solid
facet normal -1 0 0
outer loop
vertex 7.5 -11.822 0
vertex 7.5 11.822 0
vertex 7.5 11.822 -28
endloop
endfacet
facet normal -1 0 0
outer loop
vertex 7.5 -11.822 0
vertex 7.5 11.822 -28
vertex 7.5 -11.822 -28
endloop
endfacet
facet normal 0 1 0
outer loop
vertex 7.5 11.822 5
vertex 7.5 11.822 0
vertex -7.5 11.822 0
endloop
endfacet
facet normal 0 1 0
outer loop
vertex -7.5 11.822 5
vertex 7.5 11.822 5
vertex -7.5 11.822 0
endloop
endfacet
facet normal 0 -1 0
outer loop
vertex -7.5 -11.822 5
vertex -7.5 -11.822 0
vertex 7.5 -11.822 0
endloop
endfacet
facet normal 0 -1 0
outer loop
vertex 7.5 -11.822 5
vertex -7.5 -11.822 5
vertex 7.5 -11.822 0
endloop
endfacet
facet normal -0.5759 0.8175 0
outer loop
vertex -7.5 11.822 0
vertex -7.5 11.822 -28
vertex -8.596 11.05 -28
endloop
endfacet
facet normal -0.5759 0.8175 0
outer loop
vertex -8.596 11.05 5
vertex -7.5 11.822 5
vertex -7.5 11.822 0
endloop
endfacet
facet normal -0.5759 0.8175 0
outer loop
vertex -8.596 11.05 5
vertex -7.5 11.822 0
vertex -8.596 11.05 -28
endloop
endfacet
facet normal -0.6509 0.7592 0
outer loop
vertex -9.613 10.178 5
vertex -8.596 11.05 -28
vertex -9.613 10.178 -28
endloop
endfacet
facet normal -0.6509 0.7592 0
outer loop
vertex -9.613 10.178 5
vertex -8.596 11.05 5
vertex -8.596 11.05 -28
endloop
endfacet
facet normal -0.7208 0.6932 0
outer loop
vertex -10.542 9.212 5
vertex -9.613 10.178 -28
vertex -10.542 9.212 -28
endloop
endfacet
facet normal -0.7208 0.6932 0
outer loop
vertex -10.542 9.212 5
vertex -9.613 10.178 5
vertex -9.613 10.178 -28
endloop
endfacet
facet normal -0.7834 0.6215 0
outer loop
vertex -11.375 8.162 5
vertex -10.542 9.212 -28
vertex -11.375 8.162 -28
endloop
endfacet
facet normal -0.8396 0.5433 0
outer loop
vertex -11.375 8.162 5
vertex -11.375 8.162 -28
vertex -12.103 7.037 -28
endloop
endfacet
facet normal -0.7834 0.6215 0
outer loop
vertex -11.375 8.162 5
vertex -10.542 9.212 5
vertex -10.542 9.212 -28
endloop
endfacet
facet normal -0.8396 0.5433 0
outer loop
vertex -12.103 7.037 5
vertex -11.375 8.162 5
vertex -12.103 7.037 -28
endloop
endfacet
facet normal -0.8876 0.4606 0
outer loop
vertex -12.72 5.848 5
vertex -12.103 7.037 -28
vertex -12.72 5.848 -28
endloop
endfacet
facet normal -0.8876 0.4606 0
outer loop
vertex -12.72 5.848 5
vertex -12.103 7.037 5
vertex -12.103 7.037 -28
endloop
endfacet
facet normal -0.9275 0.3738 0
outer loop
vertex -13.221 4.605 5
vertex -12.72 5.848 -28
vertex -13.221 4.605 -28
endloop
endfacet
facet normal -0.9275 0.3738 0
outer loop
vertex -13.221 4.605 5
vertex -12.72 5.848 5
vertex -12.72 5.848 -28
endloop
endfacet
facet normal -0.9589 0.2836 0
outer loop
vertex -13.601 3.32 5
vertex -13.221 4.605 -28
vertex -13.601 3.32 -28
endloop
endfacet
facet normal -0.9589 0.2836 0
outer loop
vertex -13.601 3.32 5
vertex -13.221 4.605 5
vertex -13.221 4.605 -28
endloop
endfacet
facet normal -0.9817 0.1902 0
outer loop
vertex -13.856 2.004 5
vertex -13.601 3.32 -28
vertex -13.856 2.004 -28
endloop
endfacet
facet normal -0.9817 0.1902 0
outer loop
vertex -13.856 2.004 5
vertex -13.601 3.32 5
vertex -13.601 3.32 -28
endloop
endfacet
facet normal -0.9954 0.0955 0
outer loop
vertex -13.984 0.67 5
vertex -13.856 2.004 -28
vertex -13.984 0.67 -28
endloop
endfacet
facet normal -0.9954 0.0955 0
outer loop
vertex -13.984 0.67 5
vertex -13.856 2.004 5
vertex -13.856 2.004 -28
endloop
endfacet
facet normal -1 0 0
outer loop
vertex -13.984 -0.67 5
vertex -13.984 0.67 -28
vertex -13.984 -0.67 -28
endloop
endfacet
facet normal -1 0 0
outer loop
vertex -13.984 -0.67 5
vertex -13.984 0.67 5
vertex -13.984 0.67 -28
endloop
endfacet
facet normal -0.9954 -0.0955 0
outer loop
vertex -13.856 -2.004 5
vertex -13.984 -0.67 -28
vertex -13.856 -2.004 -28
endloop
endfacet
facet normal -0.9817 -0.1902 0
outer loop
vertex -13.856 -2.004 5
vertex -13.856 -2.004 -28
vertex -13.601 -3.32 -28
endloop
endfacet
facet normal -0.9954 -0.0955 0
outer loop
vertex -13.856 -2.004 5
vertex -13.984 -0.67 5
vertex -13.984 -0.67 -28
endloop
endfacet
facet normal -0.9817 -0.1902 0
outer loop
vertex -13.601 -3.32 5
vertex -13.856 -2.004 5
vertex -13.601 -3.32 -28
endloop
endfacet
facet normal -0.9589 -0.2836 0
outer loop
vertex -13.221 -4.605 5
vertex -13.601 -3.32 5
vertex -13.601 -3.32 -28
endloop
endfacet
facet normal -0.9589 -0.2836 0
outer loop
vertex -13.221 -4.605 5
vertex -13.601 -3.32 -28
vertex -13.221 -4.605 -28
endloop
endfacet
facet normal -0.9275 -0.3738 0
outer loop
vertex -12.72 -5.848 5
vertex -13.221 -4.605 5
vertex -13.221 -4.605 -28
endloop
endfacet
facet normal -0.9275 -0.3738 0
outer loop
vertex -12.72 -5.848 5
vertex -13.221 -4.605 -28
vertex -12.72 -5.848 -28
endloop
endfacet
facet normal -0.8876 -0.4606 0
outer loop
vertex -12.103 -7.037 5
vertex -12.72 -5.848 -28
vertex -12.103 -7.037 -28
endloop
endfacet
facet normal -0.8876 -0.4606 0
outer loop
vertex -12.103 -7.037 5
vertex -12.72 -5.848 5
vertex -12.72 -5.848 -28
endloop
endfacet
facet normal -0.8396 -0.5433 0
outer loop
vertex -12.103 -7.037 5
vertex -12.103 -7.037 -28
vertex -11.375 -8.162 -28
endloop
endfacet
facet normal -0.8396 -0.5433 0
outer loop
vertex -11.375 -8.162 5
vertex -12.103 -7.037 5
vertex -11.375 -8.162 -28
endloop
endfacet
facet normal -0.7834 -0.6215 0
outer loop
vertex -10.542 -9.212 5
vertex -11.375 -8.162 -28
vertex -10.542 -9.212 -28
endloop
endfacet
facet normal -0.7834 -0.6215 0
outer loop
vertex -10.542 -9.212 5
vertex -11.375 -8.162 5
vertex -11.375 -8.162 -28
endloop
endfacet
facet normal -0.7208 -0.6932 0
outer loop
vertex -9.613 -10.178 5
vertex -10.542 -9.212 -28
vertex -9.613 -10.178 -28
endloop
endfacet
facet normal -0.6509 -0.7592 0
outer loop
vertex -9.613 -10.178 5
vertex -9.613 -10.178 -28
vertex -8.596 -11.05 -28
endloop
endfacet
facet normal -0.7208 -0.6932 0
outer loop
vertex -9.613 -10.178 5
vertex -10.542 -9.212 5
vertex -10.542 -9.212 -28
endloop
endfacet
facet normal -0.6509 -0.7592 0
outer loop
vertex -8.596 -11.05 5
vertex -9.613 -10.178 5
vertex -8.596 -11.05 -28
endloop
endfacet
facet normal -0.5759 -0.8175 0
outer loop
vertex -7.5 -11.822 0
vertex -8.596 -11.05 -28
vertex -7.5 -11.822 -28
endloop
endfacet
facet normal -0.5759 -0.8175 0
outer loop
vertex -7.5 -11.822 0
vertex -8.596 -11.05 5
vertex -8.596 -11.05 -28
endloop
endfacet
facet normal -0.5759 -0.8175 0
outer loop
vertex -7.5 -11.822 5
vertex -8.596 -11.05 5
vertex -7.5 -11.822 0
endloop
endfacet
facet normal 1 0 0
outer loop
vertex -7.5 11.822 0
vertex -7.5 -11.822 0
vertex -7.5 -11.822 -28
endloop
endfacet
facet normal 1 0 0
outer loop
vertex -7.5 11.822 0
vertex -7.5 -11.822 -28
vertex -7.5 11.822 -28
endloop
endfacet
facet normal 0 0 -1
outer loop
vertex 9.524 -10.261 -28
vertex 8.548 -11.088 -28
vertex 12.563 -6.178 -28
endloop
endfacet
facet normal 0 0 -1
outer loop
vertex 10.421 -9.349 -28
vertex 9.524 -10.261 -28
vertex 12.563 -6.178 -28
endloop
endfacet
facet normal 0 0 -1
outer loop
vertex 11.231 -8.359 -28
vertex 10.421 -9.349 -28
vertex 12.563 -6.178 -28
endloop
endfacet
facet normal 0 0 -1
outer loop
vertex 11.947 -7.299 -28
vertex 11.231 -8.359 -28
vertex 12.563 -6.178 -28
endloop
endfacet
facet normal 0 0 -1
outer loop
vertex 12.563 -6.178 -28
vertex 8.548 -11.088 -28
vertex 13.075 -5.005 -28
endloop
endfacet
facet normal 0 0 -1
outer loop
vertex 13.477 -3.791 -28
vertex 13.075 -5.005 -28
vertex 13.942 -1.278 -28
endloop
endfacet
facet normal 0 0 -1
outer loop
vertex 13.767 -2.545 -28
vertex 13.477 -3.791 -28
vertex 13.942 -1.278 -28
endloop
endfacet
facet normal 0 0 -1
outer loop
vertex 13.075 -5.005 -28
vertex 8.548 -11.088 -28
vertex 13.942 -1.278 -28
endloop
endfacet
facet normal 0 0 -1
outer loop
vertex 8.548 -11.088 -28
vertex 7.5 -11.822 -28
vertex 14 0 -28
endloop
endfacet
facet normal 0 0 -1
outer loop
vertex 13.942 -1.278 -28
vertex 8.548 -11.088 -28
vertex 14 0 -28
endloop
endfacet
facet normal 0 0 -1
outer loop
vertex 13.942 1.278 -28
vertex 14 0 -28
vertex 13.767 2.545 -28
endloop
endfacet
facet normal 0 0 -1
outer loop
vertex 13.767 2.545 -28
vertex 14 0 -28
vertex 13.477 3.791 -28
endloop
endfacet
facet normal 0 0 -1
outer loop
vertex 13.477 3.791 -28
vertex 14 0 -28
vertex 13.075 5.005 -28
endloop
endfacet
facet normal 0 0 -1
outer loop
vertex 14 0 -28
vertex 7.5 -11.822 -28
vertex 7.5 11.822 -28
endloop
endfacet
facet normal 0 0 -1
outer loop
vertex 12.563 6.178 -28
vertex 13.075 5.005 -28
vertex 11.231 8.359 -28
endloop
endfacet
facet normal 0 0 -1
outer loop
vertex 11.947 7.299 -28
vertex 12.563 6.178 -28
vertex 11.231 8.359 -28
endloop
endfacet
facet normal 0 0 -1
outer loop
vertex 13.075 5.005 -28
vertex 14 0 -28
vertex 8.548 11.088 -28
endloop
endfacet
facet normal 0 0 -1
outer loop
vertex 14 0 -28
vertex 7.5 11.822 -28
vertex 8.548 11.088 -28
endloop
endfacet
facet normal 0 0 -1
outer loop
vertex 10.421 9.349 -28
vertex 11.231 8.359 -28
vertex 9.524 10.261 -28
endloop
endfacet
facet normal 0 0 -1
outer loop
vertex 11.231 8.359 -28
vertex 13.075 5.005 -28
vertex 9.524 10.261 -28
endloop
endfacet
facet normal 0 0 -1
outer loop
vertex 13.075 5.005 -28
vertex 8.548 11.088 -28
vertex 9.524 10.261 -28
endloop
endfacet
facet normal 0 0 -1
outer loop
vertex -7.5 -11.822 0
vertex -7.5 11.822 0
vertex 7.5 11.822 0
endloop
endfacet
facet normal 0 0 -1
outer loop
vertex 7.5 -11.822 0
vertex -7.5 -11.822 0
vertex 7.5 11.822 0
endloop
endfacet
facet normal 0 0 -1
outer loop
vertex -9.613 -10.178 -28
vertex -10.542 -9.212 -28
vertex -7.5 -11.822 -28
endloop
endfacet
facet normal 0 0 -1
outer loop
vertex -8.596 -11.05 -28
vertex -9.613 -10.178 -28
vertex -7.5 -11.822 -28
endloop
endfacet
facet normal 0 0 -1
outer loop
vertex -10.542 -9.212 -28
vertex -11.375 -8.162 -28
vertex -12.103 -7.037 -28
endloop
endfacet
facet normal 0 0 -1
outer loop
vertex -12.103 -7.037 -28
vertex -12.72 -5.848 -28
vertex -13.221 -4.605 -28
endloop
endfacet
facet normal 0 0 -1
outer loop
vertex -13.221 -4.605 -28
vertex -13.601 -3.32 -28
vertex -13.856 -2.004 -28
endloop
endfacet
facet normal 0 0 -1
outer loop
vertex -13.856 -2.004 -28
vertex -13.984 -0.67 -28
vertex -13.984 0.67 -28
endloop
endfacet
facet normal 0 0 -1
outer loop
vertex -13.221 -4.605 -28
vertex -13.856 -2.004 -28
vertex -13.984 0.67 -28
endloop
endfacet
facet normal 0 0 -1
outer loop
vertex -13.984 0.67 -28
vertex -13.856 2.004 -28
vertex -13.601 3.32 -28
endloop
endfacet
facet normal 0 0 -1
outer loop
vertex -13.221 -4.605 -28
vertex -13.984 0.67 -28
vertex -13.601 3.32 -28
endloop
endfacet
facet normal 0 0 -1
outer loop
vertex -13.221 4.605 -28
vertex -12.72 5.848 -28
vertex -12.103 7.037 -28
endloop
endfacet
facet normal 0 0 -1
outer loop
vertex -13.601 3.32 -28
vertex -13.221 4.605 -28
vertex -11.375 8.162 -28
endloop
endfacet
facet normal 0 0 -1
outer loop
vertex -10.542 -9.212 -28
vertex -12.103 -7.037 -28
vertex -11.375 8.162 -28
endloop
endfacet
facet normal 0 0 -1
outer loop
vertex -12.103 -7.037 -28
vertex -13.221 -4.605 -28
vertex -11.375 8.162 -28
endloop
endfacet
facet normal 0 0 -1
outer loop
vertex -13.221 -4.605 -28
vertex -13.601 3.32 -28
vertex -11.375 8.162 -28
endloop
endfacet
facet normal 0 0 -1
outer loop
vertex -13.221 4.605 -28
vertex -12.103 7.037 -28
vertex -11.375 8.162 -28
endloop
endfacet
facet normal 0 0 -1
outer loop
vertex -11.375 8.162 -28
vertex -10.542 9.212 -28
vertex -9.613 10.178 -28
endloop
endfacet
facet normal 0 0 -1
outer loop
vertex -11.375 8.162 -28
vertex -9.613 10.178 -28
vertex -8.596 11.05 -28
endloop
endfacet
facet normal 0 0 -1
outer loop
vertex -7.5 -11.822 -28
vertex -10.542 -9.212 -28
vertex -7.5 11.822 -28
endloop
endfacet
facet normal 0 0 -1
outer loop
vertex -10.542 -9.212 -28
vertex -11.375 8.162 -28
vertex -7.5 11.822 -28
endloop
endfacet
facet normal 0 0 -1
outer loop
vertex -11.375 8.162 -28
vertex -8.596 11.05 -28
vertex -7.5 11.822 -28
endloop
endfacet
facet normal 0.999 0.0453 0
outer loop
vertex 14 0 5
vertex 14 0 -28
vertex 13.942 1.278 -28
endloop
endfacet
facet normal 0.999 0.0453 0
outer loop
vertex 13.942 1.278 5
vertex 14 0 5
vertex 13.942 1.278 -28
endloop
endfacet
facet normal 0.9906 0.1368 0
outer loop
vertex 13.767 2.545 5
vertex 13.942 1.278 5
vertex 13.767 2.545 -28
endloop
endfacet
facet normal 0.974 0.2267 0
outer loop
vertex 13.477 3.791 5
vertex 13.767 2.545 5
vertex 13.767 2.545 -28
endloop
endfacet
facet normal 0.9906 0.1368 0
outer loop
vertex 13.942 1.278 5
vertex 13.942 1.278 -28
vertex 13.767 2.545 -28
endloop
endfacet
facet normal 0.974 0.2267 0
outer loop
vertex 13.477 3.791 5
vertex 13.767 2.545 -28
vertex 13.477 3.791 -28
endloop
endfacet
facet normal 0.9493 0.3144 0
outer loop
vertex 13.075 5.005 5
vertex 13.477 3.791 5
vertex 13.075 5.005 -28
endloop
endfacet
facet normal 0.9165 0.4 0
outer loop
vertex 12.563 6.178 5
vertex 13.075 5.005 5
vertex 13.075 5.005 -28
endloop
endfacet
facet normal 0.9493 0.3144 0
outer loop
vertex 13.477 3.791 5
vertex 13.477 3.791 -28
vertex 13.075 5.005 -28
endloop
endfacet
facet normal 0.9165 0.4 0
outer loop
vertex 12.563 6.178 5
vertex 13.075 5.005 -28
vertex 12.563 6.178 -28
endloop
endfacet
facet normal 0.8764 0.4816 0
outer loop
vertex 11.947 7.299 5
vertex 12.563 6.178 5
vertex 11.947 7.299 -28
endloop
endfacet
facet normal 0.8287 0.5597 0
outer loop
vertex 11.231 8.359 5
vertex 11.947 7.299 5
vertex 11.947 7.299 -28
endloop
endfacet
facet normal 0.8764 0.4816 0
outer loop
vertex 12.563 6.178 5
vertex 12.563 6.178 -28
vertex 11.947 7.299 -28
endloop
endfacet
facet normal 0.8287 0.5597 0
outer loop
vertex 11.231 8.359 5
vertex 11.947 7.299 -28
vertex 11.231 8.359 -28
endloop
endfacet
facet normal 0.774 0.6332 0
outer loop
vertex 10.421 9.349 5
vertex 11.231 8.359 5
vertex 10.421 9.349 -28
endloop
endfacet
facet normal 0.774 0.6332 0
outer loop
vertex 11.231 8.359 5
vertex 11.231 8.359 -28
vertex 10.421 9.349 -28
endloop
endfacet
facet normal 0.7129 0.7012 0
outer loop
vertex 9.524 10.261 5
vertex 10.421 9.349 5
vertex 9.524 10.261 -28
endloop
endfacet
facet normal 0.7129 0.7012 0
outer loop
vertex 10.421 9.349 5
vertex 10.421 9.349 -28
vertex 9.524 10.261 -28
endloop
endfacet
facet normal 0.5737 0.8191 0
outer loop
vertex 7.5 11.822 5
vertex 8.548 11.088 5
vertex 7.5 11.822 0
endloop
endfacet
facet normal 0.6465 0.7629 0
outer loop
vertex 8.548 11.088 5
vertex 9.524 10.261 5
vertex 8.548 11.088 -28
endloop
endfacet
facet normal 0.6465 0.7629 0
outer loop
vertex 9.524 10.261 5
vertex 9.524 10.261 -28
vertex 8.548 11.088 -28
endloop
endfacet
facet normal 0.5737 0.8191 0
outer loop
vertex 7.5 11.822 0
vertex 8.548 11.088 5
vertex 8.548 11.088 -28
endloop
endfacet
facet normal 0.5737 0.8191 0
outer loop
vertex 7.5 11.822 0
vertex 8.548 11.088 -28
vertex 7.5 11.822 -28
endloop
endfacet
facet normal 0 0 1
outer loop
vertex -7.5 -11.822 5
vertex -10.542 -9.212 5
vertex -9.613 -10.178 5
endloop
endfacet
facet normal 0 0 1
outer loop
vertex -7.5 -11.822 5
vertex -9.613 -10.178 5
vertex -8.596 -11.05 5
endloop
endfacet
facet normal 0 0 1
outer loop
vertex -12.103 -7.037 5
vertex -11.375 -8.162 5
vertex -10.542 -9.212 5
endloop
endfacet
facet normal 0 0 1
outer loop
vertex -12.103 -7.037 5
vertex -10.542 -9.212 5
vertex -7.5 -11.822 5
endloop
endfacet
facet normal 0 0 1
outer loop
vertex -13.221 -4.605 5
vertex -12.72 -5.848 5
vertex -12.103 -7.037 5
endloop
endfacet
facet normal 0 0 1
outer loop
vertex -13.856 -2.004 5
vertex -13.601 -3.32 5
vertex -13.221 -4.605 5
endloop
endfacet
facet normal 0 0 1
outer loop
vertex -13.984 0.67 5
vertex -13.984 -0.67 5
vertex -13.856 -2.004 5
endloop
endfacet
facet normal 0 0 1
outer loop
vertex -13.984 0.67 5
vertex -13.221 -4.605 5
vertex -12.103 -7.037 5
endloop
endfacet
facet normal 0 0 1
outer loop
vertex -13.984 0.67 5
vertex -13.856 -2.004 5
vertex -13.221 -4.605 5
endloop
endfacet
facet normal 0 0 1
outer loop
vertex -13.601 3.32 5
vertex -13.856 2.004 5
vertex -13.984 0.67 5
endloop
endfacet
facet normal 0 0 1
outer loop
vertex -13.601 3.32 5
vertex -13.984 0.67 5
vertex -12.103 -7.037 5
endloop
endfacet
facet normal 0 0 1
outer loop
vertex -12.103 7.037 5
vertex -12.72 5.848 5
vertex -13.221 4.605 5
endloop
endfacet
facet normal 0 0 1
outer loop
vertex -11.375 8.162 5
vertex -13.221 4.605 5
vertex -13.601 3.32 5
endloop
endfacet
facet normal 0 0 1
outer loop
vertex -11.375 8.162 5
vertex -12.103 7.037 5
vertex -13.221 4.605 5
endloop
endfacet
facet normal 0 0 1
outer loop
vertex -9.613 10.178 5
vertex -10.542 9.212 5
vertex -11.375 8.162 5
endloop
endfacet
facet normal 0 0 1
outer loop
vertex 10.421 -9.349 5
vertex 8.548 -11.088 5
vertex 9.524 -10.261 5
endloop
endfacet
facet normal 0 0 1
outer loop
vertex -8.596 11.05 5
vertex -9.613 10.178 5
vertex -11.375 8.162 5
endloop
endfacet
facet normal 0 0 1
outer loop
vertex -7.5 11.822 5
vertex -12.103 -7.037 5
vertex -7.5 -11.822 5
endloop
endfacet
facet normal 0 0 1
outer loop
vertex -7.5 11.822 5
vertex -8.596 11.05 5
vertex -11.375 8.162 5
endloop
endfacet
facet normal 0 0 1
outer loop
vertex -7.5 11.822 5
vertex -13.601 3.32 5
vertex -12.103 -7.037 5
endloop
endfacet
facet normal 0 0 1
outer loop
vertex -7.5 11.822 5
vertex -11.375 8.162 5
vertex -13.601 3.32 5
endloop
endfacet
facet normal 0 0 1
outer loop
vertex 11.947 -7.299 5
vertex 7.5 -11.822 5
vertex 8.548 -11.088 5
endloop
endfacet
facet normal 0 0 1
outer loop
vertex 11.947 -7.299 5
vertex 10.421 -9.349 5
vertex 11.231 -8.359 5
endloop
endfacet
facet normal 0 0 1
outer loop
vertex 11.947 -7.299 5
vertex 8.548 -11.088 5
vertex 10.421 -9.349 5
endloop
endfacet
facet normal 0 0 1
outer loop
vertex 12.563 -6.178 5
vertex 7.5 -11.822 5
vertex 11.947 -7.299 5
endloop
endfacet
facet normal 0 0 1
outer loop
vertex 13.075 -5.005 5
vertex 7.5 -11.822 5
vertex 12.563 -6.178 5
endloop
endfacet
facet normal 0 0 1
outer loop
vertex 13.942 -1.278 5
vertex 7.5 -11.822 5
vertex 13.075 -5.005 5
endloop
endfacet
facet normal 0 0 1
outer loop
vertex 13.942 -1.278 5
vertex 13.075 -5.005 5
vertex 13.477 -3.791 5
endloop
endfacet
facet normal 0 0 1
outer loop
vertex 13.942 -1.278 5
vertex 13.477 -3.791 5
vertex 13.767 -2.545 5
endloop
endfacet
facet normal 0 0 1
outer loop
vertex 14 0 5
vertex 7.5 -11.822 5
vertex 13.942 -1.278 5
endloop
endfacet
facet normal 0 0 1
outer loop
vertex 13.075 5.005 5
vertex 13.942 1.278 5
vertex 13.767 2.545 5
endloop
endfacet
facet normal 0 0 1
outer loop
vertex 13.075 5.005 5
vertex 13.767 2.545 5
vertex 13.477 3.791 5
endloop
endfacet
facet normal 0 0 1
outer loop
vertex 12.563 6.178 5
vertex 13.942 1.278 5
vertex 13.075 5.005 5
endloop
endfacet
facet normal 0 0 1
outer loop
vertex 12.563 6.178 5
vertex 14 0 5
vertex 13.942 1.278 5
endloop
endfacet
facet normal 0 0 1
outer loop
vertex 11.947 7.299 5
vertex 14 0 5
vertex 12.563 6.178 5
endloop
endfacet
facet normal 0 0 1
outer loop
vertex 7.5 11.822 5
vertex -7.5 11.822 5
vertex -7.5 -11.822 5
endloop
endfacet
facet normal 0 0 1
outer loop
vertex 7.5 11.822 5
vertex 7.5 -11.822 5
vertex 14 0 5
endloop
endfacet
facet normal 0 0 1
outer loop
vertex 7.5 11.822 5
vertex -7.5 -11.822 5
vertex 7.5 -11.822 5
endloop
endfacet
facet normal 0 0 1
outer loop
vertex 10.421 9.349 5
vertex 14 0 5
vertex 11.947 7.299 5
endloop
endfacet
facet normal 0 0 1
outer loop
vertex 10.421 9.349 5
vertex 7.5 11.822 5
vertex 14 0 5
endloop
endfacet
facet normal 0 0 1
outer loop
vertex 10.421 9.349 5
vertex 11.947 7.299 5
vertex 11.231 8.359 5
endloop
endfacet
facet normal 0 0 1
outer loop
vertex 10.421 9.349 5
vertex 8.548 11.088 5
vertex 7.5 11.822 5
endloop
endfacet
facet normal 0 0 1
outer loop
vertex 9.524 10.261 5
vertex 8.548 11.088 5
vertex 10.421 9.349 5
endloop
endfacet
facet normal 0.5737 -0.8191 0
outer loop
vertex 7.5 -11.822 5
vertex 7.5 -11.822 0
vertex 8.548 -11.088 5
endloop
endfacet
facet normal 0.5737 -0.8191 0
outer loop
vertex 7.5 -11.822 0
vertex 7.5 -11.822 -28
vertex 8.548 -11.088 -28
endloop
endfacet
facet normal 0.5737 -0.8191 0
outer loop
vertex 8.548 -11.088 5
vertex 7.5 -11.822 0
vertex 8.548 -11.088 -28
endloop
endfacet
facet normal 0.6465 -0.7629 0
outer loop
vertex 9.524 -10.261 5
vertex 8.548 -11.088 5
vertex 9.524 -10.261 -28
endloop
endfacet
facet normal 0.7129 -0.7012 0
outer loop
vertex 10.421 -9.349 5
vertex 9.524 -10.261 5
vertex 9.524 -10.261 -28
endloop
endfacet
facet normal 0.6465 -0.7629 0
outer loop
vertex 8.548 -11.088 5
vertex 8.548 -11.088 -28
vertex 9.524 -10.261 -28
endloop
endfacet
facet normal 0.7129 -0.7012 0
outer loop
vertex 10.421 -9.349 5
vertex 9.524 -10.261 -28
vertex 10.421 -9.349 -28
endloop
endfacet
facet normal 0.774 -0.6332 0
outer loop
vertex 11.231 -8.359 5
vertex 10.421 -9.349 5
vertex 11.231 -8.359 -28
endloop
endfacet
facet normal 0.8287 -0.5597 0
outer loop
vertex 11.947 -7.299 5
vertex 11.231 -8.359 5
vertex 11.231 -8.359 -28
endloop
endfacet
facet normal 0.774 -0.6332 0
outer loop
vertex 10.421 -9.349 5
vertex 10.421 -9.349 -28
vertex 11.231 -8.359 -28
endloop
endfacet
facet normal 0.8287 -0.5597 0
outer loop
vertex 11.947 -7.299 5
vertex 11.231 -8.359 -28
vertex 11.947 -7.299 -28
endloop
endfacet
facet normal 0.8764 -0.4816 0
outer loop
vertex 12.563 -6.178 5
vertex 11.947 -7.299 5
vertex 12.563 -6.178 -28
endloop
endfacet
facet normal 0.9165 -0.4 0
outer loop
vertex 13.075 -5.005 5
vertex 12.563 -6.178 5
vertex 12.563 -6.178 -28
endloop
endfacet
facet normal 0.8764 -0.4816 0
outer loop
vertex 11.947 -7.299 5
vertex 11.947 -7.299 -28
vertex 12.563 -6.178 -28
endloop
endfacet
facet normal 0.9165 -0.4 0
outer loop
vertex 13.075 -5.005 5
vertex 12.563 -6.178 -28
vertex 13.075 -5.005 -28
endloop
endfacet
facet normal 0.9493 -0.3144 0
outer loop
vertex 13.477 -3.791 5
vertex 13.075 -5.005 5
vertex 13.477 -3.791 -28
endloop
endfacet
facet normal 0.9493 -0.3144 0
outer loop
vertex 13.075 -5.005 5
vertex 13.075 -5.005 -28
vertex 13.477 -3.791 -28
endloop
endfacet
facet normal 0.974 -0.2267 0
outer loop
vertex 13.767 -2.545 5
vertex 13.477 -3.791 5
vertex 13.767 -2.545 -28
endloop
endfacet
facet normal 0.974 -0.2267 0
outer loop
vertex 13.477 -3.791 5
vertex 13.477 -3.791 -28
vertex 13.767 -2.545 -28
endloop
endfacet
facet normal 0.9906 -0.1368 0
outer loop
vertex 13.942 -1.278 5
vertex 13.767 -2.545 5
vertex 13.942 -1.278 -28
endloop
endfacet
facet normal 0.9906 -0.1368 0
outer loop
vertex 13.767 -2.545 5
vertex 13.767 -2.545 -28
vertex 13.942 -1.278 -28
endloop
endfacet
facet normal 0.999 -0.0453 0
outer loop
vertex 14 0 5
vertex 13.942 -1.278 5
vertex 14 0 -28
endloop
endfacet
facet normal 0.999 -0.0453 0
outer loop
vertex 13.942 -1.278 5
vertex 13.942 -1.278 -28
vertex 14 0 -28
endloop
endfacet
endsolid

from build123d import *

# Parameters (mm, degrees)
F1_DEPTH = 5
F2_DEPTH = 28


with BuildPart() as f1:
    # F0 (on Top) → F1 (new body)
    with BuildSketch(Plane.XY):
        with BuildLine():
            Line((-7.5, 0), (-7.5, 11.82159))
            ThreePointArc((-7.5, 11.82159), (-14, 0), (-7.5, -11.82159))
            Line((-7.5, -11.82159), (-7.5, 0))
        make_face()
        with BuildLine():
            Line((-7.5, -11.82159), (7.5, -11.82159))
            Line((7.5, -11.82159), (7.5, 0))
            Line((7.5, 0), (5, 0))
            ThreePointArc((5, 0), (0, -5), (-5, 0))
            Line((-5, 0), (-7.5, 0))
            Line((-7.5, 0), (-7.5, -11.82159))
        make_face()
        with BuildLine():
            Line((7.5, 0), (7.5, 11.82159))
            Line((7.5, 11.82159), (-7.5, 11.82159))
            Line((-7.5, 11.82159), (-7.5, 0))
            Line((-7.5, 0), (-5, 0))
            ThreePointArc((-5, 0), (0, 5), (5, 0))
            Line((5, 0), (7.5, 0))
        make_face()
        with BuildLine():
            ThreePointArc((7.5, -11.82159), (12.267844, -6.745369), (14, 0))
            ThreePointArc((14, 0), (12.267844, 6.745369), (7.5, 11.82159))
            Line((7.5, 11.82159), (7.5, 0))
            Line((7.5, 0), (7.5, -11.82159))
        make_face()
        with BuildLine():
            Line((0, 0), (5, 0))
            ThreePointArc((5, 0), (0, 5), (-5, 0))
            Line((-5, 0), (0, 0))
        make_face()
        with BuildLine():
            ThreePointArc((-5, 0), (0, -5), (5, 0))
            Line((5, 0), (0, 0))
            Line((0, 0), (-5, 0))
        make_face()
    extrude(amount=F1_DEPTH)

    # F0 (on Top) → F2 (join)
    with BuildSketch(Plane.XY):
        with BuildLine():
            Line((-7.5, 0), (-7.5, 11.82159))
            ThreePointArc((-7.5, 11.82159), (-14, 0), (-7.5, -11.82159))
            Line((-7.5, -11.82159), (-7.5, 0))
        make_face()
        with BuildLine():
            ThreePointArc((7.5, -11.82159), (12.267844, -6.745369), (14, 0))
            ThreePointArc((14, 0), (12.267844, 6.745369), (7.5, 11.82159))
            Line((7.5, 11.82159), (7.5, 0))
            Line((7.5, 0), (7.5, -11.82159))
        make_face()
    extrude(amount=-F2_DEPTH)


solid = f1.part
